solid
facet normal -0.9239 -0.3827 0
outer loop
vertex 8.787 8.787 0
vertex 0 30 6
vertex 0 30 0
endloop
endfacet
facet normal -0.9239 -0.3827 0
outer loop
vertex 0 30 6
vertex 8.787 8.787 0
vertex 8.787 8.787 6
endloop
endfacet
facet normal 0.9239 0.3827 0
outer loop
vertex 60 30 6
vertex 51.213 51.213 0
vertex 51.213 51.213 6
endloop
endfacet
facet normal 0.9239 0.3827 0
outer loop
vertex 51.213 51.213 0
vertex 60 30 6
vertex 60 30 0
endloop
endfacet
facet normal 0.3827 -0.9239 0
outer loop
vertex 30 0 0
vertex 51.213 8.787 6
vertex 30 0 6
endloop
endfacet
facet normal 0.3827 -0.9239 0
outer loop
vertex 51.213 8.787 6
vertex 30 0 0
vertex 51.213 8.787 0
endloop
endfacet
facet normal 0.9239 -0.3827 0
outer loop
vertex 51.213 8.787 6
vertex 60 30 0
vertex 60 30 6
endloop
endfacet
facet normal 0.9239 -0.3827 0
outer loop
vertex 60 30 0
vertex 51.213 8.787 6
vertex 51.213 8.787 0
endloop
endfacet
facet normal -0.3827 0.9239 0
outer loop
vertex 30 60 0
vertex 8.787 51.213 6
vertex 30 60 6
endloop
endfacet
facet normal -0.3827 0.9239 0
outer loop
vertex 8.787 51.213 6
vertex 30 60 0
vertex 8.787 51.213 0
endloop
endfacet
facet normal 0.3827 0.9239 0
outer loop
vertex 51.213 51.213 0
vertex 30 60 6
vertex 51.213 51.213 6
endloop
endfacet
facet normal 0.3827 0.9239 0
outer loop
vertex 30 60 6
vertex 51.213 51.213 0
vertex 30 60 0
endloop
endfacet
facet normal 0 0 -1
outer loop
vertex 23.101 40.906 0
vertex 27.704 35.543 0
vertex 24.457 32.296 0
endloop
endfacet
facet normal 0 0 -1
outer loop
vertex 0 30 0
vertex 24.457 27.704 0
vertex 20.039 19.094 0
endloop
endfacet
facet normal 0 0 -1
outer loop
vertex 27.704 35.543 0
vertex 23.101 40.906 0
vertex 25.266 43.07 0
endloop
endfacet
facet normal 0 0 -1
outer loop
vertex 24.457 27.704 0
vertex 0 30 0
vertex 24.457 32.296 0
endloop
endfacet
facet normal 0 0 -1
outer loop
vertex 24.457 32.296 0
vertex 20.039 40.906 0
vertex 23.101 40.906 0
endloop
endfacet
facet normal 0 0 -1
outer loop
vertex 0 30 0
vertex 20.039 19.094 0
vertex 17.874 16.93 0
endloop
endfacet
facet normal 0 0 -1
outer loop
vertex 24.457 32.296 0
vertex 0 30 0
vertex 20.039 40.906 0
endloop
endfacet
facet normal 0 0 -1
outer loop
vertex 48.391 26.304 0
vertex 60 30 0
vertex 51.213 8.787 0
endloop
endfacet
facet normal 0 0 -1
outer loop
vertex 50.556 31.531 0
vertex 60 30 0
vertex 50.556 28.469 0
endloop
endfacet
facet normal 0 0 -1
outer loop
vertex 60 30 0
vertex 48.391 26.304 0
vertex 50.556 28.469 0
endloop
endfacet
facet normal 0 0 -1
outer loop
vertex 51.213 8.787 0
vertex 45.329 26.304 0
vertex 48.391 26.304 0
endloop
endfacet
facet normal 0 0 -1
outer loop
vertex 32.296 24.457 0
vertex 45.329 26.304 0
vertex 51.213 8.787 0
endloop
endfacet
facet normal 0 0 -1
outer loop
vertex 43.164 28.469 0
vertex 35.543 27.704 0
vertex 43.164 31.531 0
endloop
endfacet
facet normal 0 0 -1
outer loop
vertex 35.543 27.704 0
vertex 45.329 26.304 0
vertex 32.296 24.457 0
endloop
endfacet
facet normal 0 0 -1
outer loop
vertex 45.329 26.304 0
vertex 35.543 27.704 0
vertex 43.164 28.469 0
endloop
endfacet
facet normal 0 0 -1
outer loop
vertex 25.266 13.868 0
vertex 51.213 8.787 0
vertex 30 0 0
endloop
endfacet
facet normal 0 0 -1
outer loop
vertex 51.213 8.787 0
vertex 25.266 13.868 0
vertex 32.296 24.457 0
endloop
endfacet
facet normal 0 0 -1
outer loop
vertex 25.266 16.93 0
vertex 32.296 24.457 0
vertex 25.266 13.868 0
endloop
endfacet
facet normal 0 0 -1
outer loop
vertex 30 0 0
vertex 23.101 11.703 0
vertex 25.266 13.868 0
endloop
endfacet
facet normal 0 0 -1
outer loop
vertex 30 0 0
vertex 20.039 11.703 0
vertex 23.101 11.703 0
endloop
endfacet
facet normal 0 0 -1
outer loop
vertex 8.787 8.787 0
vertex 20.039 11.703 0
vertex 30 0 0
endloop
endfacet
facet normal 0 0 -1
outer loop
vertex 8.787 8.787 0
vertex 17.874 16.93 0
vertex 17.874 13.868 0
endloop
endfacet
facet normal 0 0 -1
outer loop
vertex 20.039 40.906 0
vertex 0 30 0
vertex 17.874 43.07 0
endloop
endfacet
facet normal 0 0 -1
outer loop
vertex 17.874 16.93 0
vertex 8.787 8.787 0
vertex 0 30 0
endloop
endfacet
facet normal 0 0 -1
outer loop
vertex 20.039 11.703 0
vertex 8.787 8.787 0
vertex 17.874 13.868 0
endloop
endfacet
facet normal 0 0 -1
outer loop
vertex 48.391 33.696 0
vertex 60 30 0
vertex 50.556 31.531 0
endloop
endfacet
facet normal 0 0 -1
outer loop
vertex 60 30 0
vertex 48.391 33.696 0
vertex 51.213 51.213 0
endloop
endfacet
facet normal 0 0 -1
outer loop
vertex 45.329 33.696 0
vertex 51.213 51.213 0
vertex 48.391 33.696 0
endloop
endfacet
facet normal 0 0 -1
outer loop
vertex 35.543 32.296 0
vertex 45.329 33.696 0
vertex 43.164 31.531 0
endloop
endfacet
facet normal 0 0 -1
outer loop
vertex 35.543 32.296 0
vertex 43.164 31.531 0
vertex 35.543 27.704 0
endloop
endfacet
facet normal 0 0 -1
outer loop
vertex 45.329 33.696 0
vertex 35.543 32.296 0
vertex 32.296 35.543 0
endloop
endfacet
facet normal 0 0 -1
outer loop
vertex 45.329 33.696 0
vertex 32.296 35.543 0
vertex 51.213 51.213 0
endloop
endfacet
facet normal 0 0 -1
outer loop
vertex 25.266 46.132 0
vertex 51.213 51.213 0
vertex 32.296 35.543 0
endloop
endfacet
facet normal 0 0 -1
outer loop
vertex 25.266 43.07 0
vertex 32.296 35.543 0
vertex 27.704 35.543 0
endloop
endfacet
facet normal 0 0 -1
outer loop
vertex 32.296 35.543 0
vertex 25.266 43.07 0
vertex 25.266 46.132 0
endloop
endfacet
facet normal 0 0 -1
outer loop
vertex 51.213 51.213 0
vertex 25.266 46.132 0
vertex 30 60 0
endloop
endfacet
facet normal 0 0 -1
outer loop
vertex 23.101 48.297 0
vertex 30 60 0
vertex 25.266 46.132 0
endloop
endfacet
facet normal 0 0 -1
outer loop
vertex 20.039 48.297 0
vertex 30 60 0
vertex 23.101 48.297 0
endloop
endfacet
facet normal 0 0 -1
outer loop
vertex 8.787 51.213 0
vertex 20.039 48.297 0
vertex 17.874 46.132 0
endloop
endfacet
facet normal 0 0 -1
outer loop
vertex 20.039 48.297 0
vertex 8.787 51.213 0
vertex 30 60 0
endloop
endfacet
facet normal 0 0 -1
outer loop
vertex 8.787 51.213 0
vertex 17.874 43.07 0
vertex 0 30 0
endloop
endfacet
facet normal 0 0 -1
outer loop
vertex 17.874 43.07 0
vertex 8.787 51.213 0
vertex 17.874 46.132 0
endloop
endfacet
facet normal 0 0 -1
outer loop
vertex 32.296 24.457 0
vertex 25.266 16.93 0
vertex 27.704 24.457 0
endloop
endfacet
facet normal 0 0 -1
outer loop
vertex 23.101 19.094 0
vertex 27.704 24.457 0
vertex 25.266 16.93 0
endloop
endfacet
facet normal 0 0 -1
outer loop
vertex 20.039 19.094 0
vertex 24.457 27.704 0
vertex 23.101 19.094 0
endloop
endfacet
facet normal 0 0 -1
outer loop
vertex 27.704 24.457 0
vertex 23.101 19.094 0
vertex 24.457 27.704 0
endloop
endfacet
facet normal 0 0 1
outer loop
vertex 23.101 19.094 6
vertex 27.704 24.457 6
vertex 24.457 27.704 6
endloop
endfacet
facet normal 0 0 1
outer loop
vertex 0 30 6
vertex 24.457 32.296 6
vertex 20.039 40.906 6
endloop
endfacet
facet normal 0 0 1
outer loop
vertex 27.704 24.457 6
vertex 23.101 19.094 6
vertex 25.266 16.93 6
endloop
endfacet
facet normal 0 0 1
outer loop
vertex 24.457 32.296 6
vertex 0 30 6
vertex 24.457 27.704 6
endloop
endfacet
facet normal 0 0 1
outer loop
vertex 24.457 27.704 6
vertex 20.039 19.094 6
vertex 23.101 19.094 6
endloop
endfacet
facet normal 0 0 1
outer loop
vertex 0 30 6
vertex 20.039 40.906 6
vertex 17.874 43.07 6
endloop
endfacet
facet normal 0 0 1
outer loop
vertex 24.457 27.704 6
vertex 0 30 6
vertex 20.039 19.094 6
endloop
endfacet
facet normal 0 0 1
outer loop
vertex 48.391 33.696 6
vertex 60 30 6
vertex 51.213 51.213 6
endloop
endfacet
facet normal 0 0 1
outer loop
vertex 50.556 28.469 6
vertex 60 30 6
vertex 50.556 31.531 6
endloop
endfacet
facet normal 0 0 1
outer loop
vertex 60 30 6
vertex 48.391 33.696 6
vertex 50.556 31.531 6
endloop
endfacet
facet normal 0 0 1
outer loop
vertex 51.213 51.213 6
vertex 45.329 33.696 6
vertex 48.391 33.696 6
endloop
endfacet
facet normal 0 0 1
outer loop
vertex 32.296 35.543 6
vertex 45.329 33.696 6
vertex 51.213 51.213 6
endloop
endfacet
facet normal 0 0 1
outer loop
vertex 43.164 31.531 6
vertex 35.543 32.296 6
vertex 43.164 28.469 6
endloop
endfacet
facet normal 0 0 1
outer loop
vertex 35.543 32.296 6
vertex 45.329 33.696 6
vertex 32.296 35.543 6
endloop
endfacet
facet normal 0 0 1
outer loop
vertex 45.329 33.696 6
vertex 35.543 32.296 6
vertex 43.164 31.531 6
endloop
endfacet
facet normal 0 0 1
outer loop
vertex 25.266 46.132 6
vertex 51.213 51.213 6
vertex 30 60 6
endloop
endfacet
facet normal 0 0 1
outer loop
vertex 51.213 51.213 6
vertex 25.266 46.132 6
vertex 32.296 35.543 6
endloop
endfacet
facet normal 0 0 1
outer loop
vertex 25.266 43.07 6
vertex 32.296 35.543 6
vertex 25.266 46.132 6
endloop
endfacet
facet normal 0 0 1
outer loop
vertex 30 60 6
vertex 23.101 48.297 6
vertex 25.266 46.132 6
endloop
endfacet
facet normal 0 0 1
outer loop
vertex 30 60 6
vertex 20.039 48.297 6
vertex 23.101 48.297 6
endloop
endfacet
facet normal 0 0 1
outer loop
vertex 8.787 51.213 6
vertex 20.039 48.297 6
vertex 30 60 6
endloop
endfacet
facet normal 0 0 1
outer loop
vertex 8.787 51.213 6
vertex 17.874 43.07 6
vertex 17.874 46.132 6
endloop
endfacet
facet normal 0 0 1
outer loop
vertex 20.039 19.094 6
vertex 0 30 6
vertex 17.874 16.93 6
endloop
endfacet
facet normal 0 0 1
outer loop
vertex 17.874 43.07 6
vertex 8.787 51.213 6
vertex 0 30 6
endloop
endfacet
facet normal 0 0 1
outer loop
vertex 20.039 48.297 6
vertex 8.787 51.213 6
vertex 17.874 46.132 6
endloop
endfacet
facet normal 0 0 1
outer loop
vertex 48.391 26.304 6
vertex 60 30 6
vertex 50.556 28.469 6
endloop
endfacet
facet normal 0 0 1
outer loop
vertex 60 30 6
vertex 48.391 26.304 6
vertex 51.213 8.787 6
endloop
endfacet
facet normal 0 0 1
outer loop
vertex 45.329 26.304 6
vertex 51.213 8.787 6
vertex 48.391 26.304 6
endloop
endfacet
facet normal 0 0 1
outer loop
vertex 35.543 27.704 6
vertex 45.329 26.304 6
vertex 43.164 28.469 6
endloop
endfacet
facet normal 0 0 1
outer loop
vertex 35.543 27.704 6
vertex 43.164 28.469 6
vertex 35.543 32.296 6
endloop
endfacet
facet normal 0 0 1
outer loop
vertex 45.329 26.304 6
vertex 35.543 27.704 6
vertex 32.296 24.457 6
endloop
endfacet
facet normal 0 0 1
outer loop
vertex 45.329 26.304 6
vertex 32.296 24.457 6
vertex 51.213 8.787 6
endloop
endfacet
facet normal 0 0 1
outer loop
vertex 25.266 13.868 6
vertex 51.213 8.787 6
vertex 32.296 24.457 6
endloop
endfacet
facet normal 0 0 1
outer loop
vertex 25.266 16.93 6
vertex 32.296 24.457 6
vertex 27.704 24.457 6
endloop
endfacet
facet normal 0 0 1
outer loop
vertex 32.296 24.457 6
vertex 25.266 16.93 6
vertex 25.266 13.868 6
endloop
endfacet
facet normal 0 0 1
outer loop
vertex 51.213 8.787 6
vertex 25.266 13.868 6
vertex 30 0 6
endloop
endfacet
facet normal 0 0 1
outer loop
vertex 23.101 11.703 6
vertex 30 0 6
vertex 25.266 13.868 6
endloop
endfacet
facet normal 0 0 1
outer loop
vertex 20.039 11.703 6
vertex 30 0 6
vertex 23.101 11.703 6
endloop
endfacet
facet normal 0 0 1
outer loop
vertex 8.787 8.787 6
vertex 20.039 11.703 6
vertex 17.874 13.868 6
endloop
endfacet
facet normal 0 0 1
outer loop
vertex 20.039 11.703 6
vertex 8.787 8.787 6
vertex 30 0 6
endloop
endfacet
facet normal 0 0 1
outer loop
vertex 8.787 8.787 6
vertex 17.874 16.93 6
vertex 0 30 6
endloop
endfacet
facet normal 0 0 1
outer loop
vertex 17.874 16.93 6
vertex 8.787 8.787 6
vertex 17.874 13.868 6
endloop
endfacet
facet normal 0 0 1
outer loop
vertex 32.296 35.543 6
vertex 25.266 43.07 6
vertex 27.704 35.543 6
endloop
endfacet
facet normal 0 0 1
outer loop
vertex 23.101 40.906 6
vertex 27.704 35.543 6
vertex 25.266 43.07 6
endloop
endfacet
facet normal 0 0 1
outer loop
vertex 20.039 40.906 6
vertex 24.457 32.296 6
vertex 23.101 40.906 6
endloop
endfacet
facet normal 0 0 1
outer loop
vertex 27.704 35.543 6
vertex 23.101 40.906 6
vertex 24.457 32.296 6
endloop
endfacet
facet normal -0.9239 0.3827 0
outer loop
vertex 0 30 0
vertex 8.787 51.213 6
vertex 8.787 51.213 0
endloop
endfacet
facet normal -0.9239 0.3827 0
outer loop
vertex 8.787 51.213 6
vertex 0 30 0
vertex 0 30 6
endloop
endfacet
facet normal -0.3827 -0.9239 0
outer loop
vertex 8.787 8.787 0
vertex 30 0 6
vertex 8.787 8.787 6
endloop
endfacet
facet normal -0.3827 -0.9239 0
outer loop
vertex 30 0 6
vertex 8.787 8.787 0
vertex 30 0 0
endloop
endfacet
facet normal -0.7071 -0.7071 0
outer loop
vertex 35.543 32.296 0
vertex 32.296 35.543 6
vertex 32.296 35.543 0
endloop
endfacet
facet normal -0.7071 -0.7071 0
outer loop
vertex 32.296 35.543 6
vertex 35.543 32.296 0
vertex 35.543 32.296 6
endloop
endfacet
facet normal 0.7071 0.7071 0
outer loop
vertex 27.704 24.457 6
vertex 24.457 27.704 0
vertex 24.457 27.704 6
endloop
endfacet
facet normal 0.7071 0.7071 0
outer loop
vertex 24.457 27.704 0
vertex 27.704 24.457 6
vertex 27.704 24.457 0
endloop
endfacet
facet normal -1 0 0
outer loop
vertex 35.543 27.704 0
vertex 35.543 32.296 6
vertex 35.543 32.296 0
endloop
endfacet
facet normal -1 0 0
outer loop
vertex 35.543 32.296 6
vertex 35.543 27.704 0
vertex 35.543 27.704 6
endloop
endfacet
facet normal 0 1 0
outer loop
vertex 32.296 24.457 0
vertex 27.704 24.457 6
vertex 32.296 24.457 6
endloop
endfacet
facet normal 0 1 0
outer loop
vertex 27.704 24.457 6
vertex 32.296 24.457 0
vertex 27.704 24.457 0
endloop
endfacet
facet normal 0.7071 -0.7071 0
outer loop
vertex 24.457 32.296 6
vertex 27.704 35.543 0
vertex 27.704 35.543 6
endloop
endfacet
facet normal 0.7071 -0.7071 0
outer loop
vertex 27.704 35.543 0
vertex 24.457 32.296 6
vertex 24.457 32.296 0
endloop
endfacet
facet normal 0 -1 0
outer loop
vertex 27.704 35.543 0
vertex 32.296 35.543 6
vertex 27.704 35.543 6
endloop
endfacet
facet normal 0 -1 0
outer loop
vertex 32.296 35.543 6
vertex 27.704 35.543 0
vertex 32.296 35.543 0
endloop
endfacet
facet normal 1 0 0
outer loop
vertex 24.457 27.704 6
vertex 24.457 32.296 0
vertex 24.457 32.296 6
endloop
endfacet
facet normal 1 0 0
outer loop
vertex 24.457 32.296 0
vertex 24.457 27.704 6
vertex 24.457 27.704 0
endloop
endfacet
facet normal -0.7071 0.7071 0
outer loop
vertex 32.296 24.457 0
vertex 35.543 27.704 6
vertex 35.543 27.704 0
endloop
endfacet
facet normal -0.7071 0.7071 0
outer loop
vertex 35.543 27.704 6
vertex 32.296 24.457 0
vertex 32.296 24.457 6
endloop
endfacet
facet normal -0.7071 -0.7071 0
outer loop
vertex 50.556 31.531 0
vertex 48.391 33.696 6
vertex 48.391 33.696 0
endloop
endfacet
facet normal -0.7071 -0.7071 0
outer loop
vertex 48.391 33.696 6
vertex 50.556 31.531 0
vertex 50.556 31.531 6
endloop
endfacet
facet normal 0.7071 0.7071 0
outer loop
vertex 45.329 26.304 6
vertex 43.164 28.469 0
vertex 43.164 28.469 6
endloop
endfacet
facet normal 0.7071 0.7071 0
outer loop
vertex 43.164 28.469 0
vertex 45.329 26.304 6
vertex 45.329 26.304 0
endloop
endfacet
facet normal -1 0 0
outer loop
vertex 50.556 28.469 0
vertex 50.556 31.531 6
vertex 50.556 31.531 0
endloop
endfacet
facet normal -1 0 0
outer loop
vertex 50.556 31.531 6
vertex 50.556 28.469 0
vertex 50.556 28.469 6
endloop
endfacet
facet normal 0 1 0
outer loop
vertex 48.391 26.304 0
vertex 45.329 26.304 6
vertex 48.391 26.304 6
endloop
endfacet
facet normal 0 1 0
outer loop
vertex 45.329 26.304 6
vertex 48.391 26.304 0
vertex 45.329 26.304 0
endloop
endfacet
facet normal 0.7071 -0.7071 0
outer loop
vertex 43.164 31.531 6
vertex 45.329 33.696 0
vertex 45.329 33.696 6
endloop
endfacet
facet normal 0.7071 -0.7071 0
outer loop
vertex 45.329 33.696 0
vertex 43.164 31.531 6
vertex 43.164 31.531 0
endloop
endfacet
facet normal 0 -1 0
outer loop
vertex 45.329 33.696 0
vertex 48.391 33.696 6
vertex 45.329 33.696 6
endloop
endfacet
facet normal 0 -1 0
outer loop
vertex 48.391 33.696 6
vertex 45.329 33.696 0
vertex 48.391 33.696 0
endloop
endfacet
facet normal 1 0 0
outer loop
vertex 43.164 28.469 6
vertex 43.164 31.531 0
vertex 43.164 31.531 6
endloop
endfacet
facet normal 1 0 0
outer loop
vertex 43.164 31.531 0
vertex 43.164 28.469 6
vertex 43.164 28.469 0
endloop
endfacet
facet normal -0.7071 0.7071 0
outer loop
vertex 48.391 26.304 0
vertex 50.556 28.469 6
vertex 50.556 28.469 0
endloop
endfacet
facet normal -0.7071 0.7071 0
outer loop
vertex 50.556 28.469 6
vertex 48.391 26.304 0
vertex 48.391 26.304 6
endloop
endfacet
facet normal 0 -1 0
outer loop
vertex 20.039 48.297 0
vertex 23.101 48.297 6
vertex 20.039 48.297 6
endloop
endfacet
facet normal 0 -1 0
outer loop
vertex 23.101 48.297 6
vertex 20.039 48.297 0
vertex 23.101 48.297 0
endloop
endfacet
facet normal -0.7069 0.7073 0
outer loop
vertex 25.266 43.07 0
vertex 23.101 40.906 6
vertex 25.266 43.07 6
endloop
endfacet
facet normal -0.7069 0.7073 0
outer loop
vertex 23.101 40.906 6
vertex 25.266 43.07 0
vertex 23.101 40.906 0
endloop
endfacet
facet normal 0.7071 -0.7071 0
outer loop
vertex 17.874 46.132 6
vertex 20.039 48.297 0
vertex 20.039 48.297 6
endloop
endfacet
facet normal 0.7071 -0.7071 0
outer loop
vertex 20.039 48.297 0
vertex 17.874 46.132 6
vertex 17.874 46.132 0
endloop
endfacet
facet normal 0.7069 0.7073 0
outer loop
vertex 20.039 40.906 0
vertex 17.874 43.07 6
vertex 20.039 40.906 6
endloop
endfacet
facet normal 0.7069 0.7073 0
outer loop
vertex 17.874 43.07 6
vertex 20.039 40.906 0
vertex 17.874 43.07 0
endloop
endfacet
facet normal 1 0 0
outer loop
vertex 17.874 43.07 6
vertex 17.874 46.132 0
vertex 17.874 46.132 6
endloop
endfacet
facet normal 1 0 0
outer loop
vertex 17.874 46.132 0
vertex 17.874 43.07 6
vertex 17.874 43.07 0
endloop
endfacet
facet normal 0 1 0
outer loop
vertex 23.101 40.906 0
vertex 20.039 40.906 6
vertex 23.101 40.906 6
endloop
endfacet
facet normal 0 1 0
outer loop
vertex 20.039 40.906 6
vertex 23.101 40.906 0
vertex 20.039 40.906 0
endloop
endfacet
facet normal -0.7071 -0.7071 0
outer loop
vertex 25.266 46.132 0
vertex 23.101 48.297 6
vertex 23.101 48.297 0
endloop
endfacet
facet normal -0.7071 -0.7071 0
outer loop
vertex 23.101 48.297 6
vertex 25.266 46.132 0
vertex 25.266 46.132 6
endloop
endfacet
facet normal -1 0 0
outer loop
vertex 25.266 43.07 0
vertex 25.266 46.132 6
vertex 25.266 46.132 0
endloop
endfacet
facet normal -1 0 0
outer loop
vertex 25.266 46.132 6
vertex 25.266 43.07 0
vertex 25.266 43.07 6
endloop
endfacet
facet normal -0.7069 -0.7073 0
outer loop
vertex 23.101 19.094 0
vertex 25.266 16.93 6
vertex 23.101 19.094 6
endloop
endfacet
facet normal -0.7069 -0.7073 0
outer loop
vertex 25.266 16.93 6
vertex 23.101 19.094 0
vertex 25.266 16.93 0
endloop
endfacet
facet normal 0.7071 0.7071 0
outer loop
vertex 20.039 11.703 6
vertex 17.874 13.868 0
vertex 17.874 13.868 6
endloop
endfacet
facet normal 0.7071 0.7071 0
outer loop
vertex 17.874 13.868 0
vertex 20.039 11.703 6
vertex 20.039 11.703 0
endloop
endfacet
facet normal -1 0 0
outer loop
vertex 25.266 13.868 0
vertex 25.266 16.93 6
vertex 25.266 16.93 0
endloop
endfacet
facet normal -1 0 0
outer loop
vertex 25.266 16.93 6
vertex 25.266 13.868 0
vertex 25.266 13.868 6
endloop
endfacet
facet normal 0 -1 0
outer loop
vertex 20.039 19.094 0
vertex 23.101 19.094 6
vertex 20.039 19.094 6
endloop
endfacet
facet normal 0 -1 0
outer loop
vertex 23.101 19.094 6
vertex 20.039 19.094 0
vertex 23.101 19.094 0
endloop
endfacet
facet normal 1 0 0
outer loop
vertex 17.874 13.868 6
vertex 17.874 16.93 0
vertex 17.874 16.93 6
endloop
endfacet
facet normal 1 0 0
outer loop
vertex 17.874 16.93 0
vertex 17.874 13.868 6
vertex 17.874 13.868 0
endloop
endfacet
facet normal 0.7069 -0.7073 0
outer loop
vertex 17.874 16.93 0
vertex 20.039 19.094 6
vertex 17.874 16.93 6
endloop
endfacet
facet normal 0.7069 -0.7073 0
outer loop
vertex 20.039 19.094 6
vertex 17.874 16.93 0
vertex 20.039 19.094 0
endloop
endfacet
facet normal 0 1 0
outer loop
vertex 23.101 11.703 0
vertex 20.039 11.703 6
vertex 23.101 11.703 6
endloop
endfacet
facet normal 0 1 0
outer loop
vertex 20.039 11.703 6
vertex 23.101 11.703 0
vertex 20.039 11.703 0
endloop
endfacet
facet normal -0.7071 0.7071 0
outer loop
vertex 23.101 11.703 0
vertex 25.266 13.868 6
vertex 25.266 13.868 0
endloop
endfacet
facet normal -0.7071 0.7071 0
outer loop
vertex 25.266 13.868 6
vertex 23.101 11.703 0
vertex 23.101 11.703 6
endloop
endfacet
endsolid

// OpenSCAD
$fn = 32;

// ----------------------------------------------------------------------
// Polygon plate: 8-gon R30, 3 bolt windows
// ----------------------------------------------------------------------

// --- parameters (mm) ---
sides = 8;                // number of polygon sides
plate_r = 30;             // circumscribed radius of the polygon
bore_r = 6;               // centre bore radius
bolts = 3;                // number of bolt windows
ring_r = 16.86;           // bolt-circle radius
bolt_r = 4;               // bolt window radius
plate_t = 6;              // plate thickness, Z (extrusion height)

plate_d = 2 * plate_r;  // circumscribed diameter
bore_d = 2 * bore_r;  // centre bore diameter
bolt_d = 2 * bolt_r;  // bolt window diameter
ring_d = 2 * ring_r;  // bolt-circle diameter

profile = [[60, 30], [51.213, 51.213], [30, 60], [8.787, 51.213], [0, 30], [8.787, 8.787], [30, 0], [51.213, 8.787]];  // primary outline, 8 points, counter clockwise
void_1 = [[35.543, 32.296], [32.296, 35.543], [27.704, 35.543], [24.457, 32.296], [24.457, 27.704], [27.704, 24.457], [32.296, 24.457], [35.543, 27.704]];  // centre bore, 8 points
void_2 = [[50.556, 31.531], [48.391, 33.696], [45.329, 33.696], [43.164, 31.531], [43.164, 28.469], [45.329, 26.304], [48.391, 26.304], [50.556, 28.469]];  // bolt window 1, 8 points
void_3 = [[25.266, 46.132], [23.101, 48.297], [20.039, 48.297], [17.874, 46.132], [17.874, 43.07], [20.039, 40.906], [23.101, 40.906], [25.266, 43.07]];  // bolt window 2, 8 points
void_4 = [[25.266, 16.93], [23.101, 19.094], [20.039, 19.094], [17.874, 16.93], [17.874, 13.868], [20.039, 11.703], [23.101, 11.703], [25.266, 13.868]];  // bolt window 3, 8 points

// --- the one profile operation ---
difference() {
  linear_extrude(height = plate_t) polygon(points = profile);
  translate([0, 0, -1])
    linear_extrude(height = plate_t + 2) polygon(points = void_1);
  translate([0, 0, -1])
    linear_extrude(height = plate_t + 2) polygon(points = void_2);
  translate([0, 0, -1])
    linear_extrude(height = plate_t + 2) polygon(points = void_3);
  translate([0, 0, -1])
    linear_extrude(height = plate_t + 2) polygon(points = void_4);
}
